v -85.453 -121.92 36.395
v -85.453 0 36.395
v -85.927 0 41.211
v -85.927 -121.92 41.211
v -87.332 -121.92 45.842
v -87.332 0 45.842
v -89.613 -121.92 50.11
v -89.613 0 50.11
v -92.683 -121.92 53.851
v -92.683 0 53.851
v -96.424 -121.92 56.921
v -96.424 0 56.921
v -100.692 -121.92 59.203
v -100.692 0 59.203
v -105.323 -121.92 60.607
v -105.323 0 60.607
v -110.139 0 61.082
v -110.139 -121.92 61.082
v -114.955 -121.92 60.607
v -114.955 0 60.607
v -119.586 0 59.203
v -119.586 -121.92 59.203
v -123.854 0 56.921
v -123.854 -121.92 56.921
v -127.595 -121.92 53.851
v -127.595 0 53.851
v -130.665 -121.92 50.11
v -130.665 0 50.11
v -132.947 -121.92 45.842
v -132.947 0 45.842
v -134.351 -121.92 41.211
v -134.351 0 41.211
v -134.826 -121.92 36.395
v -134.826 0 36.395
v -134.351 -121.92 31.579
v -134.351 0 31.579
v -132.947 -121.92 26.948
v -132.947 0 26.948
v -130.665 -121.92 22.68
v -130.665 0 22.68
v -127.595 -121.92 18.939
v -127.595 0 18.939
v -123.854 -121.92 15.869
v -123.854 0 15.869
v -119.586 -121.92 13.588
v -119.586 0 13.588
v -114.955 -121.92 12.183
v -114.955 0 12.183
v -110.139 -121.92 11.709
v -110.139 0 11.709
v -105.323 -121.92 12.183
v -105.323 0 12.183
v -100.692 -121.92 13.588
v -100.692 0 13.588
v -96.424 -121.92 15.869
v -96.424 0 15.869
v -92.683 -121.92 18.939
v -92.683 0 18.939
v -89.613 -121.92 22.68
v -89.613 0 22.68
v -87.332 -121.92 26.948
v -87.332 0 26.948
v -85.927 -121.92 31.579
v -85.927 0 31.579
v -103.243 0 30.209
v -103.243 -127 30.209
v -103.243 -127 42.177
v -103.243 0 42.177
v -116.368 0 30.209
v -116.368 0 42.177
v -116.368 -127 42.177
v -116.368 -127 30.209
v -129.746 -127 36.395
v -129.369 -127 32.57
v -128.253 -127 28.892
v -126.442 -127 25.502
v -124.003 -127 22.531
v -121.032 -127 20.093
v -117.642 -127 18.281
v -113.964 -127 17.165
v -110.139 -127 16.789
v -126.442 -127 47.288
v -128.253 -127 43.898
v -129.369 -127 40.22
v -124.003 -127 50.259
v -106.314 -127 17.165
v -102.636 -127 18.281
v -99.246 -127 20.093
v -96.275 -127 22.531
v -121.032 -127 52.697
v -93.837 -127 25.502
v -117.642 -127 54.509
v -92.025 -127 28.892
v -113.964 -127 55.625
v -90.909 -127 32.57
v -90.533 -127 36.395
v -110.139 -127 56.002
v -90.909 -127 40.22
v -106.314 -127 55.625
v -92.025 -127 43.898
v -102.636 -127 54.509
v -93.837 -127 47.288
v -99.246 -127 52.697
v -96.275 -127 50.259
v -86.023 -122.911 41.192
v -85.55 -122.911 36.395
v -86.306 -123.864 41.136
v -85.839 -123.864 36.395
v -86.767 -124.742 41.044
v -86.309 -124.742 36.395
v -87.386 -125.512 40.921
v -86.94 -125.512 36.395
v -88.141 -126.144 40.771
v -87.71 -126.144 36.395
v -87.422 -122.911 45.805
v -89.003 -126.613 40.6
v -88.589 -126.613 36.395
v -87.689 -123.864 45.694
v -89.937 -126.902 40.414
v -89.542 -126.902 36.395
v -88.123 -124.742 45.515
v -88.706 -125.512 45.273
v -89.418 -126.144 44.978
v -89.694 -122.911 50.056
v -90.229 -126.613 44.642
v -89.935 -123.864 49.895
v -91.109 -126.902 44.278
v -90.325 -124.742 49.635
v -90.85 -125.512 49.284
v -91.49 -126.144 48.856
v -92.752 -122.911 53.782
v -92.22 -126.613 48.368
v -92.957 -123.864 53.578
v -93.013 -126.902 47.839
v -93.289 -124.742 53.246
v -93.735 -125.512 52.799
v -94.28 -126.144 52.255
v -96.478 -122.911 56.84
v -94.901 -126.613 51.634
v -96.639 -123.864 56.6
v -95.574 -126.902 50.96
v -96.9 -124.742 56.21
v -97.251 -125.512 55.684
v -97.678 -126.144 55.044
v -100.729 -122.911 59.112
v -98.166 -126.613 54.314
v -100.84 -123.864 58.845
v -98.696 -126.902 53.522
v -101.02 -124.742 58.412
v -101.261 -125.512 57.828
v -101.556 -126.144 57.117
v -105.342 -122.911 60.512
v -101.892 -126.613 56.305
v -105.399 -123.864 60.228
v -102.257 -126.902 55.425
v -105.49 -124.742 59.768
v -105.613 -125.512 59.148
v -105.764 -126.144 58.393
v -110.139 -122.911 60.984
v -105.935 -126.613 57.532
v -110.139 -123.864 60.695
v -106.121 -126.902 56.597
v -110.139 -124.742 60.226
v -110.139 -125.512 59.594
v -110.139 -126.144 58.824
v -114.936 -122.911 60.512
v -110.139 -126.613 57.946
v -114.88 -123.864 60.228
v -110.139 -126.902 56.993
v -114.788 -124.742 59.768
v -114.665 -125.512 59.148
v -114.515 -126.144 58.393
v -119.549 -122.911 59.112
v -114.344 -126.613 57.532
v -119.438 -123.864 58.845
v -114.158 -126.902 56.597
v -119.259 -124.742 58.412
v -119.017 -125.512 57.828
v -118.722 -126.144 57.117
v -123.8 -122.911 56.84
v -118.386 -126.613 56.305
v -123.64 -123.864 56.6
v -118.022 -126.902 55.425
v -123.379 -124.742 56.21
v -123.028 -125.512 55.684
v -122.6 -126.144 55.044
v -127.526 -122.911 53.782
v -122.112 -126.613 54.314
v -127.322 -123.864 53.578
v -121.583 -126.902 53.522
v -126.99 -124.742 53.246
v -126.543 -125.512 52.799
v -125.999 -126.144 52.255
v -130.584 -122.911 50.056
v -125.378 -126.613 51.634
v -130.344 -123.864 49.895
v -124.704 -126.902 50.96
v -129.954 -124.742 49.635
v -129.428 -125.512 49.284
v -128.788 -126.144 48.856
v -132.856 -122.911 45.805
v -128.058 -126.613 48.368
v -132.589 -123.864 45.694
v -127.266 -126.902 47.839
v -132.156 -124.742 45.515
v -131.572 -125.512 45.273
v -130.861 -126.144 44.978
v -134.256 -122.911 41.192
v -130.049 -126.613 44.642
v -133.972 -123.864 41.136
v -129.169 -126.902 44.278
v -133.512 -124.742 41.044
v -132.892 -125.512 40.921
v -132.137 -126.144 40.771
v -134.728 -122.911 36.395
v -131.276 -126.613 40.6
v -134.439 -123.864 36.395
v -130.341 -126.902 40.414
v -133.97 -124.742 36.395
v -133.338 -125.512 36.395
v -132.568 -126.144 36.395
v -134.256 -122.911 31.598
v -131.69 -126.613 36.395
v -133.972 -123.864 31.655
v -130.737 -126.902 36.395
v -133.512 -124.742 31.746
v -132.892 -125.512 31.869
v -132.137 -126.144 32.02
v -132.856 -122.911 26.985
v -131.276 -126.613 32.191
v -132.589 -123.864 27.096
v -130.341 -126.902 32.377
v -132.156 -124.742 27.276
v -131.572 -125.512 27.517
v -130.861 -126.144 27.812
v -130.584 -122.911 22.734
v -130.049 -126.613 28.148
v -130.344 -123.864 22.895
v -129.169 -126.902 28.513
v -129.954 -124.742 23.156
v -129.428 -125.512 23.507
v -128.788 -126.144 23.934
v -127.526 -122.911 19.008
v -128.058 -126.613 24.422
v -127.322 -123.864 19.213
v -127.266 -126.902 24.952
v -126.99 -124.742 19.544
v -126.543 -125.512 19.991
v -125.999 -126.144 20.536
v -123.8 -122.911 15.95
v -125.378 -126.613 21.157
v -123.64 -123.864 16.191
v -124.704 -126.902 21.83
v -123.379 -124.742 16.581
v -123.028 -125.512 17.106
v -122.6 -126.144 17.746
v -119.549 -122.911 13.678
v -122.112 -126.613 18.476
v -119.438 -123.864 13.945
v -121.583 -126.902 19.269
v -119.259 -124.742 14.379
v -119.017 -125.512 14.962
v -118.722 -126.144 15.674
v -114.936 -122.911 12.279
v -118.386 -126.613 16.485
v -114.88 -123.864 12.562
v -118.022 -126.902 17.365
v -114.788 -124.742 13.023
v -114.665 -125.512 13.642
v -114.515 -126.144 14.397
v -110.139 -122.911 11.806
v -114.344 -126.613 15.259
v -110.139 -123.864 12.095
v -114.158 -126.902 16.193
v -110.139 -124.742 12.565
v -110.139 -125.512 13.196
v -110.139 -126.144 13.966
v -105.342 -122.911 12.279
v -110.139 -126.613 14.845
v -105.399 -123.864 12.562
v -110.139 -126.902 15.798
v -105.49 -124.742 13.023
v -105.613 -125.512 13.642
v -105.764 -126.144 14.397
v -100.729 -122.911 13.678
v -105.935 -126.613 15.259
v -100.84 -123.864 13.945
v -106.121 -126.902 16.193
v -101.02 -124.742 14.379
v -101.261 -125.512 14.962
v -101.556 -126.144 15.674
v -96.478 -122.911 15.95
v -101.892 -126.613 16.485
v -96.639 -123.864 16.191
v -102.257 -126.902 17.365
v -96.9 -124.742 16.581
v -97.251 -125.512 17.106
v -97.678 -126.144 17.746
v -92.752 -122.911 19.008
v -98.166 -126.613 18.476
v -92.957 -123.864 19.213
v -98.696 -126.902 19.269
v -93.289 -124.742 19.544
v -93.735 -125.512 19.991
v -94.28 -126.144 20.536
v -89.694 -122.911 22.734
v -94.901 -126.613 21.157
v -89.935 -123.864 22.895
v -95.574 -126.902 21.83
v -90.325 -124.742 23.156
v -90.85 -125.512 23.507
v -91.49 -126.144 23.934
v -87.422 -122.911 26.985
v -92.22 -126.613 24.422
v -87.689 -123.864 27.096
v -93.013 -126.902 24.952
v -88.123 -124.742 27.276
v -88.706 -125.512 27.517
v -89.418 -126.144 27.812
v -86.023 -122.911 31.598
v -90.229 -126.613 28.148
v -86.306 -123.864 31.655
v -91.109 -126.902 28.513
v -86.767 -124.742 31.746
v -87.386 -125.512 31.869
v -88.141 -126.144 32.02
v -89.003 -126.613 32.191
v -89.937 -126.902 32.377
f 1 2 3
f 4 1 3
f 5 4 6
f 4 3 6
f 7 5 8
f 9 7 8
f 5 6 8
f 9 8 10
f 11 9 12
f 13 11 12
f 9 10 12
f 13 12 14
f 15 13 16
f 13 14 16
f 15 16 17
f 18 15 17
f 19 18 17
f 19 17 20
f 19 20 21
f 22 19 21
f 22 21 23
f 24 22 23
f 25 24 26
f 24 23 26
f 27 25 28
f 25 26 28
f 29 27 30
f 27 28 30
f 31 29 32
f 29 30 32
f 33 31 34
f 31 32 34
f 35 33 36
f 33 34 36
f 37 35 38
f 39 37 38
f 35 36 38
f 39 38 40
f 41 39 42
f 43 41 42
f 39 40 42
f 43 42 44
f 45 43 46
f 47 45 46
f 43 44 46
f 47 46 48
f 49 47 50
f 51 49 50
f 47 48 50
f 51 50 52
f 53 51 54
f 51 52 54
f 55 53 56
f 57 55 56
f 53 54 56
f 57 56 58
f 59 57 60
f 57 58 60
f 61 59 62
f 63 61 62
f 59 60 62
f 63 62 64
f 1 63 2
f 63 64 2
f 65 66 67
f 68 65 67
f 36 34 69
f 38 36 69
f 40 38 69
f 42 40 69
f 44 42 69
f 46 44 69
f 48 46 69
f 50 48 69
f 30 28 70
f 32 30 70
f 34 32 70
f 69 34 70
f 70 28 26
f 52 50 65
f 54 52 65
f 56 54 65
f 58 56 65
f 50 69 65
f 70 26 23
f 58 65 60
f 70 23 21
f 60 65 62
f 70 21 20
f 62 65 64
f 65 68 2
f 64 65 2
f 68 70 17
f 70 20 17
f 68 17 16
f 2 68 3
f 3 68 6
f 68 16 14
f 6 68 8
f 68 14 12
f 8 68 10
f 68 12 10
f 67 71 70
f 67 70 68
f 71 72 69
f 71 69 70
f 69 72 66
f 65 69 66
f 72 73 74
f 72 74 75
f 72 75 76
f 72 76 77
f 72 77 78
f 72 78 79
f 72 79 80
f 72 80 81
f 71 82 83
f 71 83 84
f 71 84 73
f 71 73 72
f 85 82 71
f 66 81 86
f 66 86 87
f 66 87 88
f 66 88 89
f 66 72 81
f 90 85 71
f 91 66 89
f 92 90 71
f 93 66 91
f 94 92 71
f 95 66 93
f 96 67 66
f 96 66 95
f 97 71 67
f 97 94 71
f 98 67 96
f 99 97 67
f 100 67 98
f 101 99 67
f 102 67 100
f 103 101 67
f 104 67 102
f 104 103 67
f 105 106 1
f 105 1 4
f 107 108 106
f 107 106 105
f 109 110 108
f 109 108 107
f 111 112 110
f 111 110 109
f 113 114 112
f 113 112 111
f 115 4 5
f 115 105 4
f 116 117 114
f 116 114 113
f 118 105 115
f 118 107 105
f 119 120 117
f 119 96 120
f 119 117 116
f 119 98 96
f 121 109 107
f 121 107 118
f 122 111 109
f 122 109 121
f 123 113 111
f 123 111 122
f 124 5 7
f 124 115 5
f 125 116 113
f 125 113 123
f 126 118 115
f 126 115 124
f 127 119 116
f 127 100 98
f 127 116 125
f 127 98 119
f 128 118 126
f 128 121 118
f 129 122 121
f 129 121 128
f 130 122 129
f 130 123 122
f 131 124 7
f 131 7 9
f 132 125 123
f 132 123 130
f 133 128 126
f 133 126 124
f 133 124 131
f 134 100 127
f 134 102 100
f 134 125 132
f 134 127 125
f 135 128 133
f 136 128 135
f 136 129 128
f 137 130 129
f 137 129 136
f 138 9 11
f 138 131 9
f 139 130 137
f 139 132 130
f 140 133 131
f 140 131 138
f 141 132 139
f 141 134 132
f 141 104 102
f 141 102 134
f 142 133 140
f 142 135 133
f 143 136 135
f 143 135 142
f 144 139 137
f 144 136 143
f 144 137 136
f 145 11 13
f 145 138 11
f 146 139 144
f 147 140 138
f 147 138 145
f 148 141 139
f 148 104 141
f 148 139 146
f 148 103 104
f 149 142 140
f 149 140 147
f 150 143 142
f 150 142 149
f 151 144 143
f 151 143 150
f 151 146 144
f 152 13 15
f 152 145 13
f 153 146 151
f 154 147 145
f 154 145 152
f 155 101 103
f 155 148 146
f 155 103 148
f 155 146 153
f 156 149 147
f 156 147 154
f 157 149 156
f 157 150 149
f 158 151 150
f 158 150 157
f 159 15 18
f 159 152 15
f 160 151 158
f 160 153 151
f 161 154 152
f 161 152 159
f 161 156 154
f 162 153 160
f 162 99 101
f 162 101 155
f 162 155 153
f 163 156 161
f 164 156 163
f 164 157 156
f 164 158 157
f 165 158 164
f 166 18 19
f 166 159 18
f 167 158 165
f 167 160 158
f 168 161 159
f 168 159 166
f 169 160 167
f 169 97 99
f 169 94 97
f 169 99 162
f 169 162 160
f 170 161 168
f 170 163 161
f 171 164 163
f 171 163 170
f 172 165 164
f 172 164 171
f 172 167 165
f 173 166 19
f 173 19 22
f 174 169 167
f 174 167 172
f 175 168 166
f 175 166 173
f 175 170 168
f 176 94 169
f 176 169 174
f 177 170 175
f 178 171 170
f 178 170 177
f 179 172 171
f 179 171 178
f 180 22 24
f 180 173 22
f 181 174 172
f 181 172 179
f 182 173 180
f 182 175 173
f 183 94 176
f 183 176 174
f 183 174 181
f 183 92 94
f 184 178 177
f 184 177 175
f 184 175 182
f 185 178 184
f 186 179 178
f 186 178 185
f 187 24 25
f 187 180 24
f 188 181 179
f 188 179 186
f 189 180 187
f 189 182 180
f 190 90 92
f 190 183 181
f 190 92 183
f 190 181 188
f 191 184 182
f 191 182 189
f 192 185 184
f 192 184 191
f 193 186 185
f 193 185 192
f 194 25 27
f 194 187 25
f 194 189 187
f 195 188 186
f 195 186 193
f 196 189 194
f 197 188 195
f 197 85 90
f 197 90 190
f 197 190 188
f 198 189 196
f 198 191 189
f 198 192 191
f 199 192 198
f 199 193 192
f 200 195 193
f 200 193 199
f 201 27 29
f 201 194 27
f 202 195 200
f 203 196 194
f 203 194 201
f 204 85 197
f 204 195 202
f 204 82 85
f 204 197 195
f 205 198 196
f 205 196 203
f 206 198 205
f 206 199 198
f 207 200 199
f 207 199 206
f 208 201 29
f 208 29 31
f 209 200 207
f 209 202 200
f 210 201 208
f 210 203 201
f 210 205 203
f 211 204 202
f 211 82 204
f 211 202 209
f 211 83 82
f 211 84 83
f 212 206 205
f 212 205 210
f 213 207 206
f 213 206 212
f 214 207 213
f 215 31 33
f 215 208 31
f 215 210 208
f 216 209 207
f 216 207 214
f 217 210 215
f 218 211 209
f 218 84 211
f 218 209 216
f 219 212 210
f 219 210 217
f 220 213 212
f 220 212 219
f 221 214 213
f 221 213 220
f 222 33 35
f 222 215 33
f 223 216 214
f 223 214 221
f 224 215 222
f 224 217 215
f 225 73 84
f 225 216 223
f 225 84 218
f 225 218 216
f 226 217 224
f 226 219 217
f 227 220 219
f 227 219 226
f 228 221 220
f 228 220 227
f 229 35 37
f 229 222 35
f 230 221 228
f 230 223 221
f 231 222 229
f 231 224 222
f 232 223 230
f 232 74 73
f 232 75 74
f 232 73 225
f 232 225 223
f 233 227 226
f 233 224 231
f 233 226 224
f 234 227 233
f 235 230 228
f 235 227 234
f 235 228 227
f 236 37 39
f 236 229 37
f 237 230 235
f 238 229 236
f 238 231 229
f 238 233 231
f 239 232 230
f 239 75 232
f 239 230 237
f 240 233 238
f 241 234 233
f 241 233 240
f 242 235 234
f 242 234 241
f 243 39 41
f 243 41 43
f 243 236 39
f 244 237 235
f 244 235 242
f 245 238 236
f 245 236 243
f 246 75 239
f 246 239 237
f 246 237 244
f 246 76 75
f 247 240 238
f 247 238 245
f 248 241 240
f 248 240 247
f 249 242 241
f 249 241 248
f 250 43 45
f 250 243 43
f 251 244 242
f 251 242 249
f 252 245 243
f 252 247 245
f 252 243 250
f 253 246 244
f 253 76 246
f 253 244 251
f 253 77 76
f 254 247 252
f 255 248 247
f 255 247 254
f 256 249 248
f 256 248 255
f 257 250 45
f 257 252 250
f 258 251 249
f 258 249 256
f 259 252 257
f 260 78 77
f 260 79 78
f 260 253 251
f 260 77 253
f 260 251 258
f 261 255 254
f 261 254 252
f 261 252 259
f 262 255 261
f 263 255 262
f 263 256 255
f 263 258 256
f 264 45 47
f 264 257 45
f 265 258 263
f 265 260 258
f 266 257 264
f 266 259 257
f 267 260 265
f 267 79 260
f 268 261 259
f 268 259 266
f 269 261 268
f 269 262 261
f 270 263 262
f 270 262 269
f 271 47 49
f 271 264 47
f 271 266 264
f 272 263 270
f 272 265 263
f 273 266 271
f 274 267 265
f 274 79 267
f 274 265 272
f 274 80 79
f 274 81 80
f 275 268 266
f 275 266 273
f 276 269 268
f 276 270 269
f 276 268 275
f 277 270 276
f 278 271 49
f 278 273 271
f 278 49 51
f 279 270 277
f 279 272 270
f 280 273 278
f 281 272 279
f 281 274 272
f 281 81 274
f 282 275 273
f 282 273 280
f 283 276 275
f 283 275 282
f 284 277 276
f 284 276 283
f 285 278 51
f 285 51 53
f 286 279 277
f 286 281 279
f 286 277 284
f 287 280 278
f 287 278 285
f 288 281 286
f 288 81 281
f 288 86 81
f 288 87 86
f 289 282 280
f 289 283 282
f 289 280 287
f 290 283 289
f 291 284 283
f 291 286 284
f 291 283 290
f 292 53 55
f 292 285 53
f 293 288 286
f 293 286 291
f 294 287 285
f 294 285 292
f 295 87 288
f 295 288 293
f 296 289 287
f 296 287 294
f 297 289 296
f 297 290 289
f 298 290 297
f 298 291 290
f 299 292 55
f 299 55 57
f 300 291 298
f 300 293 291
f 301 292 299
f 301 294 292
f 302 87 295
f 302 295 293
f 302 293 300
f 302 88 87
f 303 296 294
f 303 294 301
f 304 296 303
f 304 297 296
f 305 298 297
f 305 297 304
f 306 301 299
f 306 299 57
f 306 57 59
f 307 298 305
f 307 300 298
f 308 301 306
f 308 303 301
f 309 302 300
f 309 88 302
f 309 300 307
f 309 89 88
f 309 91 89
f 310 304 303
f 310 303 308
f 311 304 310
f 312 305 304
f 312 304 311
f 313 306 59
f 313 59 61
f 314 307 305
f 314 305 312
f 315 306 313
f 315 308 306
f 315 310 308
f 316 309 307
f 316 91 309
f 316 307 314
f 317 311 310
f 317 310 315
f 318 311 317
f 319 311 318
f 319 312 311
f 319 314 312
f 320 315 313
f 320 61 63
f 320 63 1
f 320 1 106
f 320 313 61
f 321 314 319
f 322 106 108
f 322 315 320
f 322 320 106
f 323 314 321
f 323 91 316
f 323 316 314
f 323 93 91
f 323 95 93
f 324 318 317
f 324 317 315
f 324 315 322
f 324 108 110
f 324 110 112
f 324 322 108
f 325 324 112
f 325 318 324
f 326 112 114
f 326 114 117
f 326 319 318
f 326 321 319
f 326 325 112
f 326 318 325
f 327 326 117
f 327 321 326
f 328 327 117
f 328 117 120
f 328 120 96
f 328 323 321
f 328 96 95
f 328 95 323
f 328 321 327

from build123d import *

# Parameters (mm, degrees)
F0_R     = 24.686614
F1_DEPTH = 127
F2_R     = 5.08
F3_W     = 13.125889
F3_H     = 11.96772
F4_DEPTH = 127.001


with BuildPart() as f1:
    # F0 (on Front) → F1 (new body)
    with BuildSketch(Plane.XZ):
        with Locations((-110.139199, 36.395181)):
            Circle(F0_R)
    extrude(amount=F1_DEPTH)

    # F2
    f2_edges = [f1.edges().sort_by_distance(p)[0] for p in [
        (-134.825813, -127, 36.395181),
    ]]
    fillet(f2_edges, radius=F2_R)

    # F3 (on face) → F4 (cut, through all)
    with BuildSketch(Plane.XZ.offset(127)):
        with Locations((-109.805476, 36.192703)):
            Rectangle(F3_W, F3_H)
    extrude(amount=-F4_DEPTH, mode=Mode.SUBTRACT)


solid = f1.part
